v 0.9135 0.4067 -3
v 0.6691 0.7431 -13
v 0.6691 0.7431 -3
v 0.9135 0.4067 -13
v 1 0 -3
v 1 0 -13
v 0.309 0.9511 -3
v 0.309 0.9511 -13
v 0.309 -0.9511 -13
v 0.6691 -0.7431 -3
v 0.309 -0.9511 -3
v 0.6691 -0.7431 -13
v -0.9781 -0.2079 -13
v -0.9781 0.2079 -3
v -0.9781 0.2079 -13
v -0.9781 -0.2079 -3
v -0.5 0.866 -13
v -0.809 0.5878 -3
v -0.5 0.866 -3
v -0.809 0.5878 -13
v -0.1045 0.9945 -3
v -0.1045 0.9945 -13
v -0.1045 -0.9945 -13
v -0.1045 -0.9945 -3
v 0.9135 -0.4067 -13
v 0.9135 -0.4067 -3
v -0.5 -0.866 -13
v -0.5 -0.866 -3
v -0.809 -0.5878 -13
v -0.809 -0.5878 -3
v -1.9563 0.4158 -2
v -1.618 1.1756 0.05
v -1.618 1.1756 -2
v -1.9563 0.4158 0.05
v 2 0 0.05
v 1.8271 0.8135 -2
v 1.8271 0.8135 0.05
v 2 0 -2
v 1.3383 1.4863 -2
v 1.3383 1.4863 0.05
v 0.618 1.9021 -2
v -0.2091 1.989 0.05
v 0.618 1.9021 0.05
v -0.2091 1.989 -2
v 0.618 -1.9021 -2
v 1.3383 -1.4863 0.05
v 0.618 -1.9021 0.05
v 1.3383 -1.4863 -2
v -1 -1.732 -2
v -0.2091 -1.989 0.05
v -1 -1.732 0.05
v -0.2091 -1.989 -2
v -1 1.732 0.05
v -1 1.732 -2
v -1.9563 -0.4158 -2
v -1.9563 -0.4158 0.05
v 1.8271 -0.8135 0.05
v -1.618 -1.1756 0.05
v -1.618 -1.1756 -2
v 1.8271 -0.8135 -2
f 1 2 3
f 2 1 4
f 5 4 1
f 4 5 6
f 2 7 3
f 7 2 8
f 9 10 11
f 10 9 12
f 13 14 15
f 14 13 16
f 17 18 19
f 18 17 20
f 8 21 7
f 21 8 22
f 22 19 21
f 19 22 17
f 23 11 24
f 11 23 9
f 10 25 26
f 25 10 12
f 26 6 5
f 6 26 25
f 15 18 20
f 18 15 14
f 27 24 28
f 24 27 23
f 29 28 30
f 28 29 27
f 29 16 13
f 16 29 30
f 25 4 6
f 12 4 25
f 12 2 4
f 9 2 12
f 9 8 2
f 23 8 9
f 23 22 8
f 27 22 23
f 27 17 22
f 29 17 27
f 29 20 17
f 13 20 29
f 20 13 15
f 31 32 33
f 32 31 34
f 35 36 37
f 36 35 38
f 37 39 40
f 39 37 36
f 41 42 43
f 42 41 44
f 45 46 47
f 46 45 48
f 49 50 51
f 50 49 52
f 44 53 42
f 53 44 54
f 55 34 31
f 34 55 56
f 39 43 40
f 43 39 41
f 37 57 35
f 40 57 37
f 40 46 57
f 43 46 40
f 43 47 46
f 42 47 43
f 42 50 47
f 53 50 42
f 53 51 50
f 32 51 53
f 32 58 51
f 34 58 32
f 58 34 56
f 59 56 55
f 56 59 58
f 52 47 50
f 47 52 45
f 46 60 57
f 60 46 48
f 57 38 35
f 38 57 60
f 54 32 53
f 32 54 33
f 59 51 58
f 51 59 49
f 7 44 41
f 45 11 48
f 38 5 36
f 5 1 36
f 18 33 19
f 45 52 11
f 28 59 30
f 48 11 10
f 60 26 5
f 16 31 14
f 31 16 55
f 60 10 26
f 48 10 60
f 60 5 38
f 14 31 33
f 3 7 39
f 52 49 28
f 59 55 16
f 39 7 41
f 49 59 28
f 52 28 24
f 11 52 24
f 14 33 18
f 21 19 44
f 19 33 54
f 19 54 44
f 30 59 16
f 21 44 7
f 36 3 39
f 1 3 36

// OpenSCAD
// file: Settings.scad
// Mesurements Of Platform Actual & Global Settings
// Mesurements ACTUAL
PlateWidth = 228;
PlateDepth = 145;
PlateHeight = 5;

ArmWidth = 20;
ArmHeight = 24;
ArmForwardProjection = 25;
ArmRearProjection = 50;
ArmVOffset = 15;

BaseWidth = 129;
BaseHeight = 5;
BaseForwardProjection = 10;
BaseRearProjection = 10;
BaseVOffset = 20;

BaseDeflectorLength = 20;
BaseDeflectorAngle = 45;

ScrewsWidthOutset = 35;
ScrewsDepthOutset = 35;
ScrewsHeadRadius = 10;
ScrewsHeadHeight = 2;
ScrewsHeadProtrusion = 5;
ScrewsShaftRadius = 2;
ScrewsHeadCutoutRadius = 2;

RearPlugWidth = 10;
RearPlugHeight = 5;
RearPlugVOffset = 1;

// Options
// ****************************************************************************************************

d = 0.05;   //Delta

ClipSticksize = 8;
PlateThickness = 5;

TensionerBearingRadius = 2;
TensionerOffsetRadius = 15;
TensionerAngle = 45;
TensionerBearingExtention = 3;
TensionerInset = 2;

//lips to keep the belt in
Lip = 3;
//TopLip = 500;
BottomLip = 5;

MidPlateOverlap = 20;
MidPlateOverlapHeight = 10;
MidPlateOverlapOffset = 7;
ClipHoleSize = 5;

LowerPlateCrossover =10;

RollerCore = 2;
RollerClearance = 2;
RollerLength = PlateDepth - 2*RollerClearance;

UpperRollerProjection  = 40;
UpperRollerRadius = 8;

LowerRollerProjection = 20;
LowerRollerRadius = 6;

RollerBearingCutoutRadius = 3;

IbeamProjection = 15;
IbeamPlateThikness = 6;


// Calculated
// ************************************************************************************************************
PlateX = BaseWidth/2;

RollerLength = PlateDepth - 2*RollerClearance;
PlateArmOverhang = PlateWidth/2 - BaseWidth/2  - ArmWidth; 

UpperRollerPlateX = ArmWidth+PlateArmOverhang+UpperRollerProjection-UpperRollerRadius;
UpperRollerPlateY = -UpperRollerRadius; 

LowerRollerPlateX = ArmWidth+PlateArmOverhang+LowerRollerProjection-LowerRollerRadius;
LowerRollerPlateY = -(ArmVOffset+ArmHeight)+LowerRollerRadius;
// main file
//Misc
include <Settings.scad>;

ScrewHole();

module ScrewHole(
ThreadLength = 10,
ThreadRadius = 1,
SinkLength = 2,
SinkRadius = 2,
SinkTaperLength = 1){
	translate(v=[0,0,-ThreadLength-SinkTaperLength-SinkLength])
		color("DarkViolet") cylinder(h=ThreadLength,r=ThreadRadius, $fn = 15);

	translate(v=[0,0,-SinkLength])
		color("RosyBrown") cylinder(h=SinkLength+d,r=SinkRadius, $fn = 15);

	translate(v=[0,0,-SinkLength-SinkTaperLength])
		color("RosyBrown") cylinder(h=SinkTaperLength,r1=ThreadRadius,r2=SinkRadius , $fn = 15);
};
